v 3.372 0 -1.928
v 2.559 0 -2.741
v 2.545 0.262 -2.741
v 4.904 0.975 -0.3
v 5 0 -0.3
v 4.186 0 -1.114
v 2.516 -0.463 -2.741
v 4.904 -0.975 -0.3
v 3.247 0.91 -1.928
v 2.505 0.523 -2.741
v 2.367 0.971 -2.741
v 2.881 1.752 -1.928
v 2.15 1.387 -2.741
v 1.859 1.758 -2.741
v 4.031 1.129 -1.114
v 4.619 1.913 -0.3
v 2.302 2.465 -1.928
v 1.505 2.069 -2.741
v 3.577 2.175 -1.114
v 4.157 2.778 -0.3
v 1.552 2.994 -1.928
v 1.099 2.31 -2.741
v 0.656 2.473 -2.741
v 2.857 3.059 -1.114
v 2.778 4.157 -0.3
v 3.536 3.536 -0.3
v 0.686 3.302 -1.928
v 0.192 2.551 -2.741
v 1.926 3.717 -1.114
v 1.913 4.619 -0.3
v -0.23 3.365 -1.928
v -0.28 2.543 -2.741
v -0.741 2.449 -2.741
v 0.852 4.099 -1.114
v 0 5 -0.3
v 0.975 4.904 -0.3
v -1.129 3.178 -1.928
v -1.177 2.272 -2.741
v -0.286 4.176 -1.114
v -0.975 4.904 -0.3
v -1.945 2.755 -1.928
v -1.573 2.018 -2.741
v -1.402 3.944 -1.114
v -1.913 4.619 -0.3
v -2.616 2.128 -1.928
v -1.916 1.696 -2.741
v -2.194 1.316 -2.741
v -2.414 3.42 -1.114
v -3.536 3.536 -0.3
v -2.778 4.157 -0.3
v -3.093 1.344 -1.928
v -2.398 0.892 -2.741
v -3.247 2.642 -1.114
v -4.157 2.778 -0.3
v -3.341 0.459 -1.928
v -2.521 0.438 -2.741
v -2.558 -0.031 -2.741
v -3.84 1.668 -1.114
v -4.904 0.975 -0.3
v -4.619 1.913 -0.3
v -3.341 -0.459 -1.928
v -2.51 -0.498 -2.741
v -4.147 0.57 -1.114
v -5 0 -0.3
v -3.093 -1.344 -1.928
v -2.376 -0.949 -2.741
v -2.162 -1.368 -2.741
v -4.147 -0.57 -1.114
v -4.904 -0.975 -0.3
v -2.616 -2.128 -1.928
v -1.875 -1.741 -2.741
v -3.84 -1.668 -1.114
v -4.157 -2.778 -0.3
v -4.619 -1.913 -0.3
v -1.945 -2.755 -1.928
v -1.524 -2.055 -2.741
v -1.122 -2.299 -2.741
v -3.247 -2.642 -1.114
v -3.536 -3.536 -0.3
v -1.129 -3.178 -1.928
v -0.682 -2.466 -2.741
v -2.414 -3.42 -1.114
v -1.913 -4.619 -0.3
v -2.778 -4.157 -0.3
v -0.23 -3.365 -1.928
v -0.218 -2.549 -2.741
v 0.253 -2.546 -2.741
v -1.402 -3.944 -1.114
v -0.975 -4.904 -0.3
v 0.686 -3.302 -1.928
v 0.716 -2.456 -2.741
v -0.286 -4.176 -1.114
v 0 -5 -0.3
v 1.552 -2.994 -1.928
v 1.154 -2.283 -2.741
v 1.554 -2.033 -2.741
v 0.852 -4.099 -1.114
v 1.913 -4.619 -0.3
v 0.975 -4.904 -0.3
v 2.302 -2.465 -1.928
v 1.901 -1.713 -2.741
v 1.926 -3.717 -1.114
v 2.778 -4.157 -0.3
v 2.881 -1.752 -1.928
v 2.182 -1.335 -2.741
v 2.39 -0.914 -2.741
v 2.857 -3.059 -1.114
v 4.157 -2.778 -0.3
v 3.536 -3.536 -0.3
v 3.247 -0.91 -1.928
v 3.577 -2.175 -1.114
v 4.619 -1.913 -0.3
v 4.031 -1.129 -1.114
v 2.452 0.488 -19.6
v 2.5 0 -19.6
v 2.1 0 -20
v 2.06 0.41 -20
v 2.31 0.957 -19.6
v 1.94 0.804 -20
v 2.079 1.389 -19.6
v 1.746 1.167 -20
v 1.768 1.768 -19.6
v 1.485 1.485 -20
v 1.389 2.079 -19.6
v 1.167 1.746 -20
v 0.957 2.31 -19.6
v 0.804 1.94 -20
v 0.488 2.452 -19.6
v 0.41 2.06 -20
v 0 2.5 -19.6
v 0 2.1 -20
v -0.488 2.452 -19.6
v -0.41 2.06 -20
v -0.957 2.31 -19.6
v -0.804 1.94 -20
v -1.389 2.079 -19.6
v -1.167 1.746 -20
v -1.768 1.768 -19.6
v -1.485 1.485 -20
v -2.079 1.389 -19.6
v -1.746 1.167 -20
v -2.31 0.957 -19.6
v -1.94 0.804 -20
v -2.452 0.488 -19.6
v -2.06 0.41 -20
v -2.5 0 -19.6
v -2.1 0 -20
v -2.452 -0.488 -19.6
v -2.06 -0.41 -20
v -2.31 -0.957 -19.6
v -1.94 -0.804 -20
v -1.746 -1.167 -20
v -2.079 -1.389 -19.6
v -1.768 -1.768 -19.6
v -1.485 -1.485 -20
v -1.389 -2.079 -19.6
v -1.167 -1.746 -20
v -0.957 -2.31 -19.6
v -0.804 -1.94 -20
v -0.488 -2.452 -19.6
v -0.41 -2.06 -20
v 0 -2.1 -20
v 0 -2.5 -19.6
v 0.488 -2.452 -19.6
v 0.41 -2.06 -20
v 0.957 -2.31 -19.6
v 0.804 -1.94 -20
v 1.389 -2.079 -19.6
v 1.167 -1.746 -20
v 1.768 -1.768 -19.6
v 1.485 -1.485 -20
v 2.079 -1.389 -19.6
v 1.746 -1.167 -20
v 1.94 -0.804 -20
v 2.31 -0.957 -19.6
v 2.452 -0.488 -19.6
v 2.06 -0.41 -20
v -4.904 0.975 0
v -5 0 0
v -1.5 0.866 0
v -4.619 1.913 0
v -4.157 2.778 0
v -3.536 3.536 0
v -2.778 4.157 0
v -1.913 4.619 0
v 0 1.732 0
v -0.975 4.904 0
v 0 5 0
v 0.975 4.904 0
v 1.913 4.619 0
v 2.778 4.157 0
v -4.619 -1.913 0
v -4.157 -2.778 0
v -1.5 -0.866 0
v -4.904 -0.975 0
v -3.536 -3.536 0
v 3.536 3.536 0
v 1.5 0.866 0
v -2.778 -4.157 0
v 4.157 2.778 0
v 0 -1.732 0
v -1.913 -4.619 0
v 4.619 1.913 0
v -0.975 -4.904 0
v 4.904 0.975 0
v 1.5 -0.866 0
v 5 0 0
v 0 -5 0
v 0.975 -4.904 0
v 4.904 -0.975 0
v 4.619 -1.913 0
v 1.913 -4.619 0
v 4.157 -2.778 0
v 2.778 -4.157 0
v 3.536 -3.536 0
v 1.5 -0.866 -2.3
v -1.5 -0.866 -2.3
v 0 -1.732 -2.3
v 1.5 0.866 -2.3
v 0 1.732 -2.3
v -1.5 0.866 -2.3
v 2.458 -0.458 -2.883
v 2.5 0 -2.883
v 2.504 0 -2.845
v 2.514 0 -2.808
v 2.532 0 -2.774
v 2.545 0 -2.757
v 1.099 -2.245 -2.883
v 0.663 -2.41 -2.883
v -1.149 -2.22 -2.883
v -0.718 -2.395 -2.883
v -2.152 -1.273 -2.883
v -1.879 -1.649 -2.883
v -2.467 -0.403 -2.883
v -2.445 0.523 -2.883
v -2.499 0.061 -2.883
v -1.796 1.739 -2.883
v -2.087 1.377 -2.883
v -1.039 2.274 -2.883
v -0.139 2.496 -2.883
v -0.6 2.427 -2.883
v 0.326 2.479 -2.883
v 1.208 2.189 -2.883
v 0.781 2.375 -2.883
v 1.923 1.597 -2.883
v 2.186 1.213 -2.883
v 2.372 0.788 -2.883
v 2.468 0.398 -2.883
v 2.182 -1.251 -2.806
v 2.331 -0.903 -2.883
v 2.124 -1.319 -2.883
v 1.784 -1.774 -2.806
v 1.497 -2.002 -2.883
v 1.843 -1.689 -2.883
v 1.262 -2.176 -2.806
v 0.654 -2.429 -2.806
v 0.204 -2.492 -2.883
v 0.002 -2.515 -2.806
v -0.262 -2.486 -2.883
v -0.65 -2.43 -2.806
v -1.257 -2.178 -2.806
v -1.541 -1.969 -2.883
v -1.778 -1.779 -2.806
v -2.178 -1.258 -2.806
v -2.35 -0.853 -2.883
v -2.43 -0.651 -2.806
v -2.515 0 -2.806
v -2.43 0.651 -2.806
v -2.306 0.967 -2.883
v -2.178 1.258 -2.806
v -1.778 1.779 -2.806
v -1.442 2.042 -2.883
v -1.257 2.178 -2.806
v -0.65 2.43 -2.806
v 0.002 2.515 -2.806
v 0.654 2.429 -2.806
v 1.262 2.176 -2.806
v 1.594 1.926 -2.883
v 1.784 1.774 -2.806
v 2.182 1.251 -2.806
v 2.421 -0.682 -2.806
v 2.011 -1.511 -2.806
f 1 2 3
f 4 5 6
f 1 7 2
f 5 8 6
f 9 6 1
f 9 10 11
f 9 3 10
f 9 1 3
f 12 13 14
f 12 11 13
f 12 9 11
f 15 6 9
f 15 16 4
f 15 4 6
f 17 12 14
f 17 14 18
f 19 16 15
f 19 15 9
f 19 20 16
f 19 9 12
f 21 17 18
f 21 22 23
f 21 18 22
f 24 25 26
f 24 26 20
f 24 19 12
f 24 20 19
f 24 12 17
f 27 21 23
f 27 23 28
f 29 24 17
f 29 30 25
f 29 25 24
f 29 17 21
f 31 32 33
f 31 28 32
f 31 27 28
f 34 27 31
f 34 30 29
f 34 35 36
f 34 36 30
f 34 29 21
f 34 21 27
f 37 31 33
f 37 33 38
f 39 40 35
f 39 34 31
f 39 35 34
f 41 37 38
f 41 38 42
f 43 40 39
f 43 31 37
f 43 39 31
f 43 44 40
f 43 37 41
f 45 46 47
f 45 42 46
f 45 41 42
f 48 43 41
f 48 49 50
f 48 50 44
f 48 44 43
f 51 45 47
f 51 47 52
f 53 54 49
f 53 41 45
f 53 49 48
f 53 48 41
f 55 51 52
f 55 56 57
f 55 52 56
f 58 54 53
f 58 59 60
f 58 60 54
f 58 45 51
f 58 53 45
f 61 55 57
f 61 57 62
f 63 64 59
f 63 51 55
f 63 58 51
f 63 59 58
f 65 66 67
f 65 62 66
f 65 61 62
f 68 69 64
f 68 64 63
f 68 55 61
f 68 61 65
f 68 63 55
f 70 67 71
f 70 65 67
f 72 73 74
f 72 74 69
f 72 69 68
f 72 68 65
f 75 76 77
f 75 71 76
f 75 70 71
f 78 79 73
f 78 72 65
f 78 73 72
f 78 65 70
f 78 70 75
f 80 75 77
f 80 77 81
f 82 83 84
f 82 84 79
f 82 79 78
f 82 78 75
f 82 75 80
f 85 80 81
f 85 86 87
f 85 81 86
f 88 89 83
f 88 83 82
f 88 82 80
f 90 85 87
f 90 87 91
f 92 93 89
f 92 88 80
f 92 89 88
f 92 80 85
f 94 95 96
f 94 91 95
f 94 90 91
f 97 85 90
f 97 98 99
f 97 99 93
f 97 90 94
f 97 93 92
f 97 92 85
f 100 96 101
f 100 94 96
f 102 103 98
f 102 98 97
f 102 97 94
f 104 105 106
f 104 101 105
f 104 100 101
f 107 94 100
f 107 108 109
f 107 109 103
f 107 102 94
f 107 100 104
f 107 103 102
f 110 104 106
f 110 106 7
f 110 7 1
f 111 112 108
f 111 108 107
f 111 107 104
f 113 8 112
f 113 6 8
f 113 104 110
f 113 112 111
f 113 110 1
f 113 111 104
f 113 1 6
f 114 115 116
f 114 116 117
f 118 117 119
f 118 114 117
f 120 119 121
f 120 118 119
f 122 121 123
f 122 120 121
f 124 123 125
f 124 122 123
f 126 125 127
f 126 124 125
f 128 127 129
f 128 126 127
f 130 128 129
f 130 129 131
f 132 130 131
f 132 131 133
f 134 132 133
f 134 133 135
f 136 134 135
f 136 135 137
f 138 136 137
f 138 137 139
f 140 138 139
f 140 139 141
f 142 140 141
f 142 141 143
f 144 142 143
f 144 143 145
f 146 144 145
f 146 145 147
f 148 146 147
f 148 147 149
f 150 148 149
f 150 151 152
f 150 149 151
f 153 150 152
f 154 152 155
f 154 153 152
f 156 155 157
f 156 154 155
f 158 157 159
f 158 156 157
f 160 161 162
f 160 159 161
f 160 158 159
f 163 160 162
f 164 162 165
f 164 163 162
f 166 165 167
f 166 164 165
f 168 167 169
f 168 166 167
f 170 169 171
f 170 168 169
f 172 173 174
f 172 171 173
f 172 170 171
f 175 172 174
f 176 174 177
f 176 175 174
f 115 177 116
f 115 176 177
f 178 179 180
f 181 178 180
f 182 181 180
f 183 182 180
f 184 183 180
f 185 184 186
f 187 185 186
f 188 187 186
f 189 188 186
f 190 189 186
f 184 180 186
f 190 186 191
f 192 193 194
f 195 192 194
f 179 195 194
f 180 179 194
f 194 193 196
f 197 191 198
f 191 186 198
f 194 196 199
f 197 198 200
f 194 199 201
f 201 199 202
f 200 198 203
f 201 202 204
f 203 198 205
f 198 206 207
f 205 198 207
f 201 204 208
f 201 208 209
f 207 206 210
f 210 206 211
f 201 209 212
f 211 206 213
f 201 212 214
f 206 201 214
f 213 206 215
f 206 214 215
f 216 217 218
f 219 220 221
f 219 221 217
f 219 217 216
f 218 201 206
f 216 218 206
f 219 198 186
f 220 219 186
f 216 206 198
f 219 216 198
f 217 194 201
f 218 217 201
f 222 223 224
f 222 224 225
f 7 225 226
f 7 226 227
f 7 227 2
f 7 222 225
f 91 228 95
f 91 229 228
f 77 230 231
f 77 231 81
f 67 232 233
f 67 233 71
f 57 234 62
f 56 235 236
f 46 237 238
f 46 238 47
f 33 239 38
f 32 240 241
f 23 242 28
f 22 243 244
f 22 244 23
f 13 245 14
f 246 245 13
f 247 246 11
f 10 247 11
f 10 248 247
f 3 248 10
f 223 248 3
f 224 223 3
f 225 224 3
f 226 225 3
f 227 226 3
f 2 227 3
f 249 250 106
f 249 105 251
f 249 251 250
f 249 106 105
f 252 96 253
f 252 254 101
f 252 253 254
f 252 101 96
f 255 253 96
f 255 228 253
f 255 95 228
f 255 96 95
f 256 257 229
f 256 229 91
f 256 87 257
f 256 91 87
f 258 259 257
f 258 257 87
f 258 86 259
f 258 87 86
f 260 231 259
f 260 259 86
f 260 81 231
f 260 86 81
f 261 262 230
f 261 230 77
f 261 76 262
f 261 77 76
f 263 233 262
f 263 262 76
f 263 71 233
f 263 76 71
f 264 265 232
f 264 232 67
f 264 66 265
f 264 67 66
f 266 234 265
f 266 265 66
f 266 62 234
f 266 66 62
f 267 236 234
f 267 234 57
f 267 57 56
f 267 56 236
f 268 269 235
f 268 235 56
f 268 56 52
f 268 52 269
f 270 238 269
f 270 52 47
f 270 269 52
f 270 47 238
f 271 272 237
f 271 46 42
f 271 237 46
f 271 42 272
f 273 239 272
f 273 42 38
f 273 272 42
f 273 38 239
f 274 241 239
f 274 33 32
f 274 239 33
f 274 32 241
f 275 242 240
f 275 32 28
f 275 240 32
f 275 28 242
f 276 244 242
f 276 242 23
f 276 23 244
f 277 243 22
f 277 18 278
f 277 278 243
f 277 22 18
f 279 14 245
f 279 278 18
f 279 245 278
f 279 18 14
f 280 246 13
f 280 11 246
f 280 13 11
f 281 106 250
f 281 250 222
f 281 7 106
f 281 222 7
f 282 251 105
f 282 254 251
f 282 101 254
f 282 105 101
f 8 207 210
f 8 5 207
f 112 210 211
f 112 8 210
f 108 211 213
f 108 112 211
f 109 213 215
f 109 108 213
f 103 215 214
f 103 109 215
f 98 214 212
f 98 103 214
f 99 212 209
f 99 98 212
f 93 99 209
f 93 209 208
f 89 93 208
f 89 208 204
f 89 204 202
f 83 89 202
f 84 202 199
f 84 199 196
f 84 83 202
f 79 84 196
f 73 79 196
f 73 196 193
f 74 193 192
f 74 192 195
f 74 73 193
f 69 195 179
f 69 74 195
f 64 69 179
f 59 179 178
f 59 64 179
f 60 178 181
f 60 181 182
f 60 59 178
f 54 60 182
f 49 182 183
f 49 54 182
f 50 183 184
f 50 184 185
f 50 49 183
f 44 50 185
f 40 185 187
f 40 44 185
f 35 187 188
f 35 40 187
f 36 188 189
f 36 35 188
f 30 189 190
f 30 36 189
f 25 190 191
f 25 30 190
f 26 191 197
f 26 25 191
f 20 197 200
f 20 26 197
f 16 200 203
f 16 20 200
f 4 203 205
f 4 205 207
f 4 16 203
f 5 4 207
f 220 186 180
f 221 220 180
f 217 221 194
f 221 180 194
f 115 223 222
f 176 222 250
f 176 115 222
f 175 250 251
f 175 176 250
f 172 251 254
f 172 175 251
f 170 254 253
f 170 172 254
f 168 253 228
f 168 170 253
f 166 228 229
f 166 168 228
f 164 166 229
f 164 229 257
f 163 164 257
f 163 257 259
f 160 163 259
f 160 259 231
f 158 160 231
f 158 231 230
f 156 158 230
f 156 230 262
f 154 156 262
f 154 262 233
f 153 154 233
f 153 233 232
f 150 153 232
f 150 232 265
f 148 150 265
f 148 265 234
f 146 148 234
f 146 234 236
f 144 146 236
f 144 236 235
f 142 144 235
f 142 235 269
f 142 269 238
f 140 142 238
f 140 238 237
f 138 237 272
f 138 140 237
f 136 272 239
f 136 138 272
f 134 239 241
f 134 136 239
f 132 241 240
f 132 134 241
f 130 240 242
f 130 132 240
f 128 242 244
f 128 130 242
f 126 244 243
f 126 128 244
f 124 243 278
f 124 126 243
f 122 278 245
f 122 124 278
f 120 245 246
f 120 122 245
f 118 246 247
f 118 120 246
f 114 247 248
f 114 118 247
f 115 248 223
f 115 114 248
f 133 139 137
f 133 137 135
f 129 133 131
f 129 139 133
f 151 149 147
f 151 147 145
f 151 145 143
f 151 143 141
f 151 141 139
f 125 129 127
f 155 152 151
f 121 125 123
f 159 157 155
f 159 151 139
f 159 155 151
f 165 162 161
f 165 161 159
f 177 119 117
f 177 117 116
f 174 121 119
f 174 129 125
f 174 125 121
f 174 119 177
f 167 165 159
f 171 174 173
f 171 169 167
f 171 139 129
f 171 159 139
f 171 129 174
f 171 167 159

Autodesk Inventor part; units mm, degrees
ref_plane "YZ Plane" through (0, 0, 0) normal (1, 0, 0) x (0, 1, 0)
sketch "Sketch1" plane through (0, 0, 0) normal (0, 1, 0) x (-1, 0, 0)
  point P0 (0, 0)
sketch "Sketch2" plane through (0, 0, 0) normal (0, 1, 0) x (-1, 0, 0)
  line L0 (-2.5, -20) -> (0, -20)
  line L1 (-2.5, -2.8) -> (-2.5, -20)
  line L2 (-5, -0.3) -> (-2.5, -2.8)
  line L3 (-5, 0) -> (-5, -0.3)
  line L4 (0, 0) -> (-5, 0)
  line L5 (0, -20) -> (0, 0)
  line L6 (0, -20) -> (0, 0)
  line L7 (0, -24) -> (0, 4) projected
  line L8 (1, 0) -> (-6, 0) projected
  dimension "d3" = 5
  dimension "d5" = 2.5
  dimension "d7" = 20
  dimension "ParC" = 0.3
  dimension "d22" = 0
  dimension "d23" = 0
  dimension "d43" = 45
revolve "Revolution1" add sketch "Sketch2" angle 360 about axis through (0, 0, -20) along (0, 0, -1)
sketch "Sketch3" plane through (0, 0, 0) normal (0, 0, 1) x (1, 0, 0)
  line L0 (-1.5, 0.866) -> (-1.5, -0.866)
  line L1 (0, 1.7321) -> (-1.5, 0.866)
  line L2 (1.5, 0.866) -> (0, 1.7321)
  line L3 (1.5, -0.866) -> (1.5, 0.866)
  line L4 (0, -1.7321) -> (1.5, -0.866)
  line L5 (-1.5, -0.866) -> (0, -1.7321)
  circle A0 centre (0, 0) radius 1.5 construction
  circle A1 centre (0, 0) radius 2.5 construction
  dimension "d11" = 3
  dimension "d13" = 120
  dimension "d15" = 120
extrude "Extrusion1" cut sketch "Sketch3" against normal blind 2.3
fillet "Fillet1" radius 0.2 1 edges at (-2.5, 0, -2.8)
chamfer "Chamfer1" distance 0.4 angle 45 1 edges at (-2.5, 0, -20) measured on face at (-0.599, -2.4272, -14.2943)
thread "Thread1" size "M5x0.8" class "6g" standard "ISO Metric profile" length 15.6
ref_plane "MSC_PF1" through (0, 0, 0) normal (1, 0, 0) x (0, 1, 0)
ref_plane "MSC_PT1" through (0, 0, 0) normal (0, 0, -1) x (-1, 0, 0)
equation "\"d3\" = 0.5 * dk"
equation "\"d5\" = 0.5 * NND"
equation "\"d7\" = NLG"
equation "\"d43\" = 0.5 * ang"
equation "\"d18\" = r"
equation "\"d19\" = 0.5 * PTC"
equation "\"d39\" = 0.5 * PTC"
equation "\"d11\" = ParS"
equation "\"d16\" = ParT"
equation "\"NND\" = 5"
equation "\"PTC\" = 0.8"
equation "\"ParK\" = 2.8"
equation "\"ParS\" = 3"
equation "\"ParT\" = 2.3"
equation "\"r\" = 0.2"
equation "\"NLG\" = 20"
equation "\"ang\" = 90deg"
equation "\"THREADDIA\" = NND"
equation "\"dk\" = 10"
properties part number "DIN 7991 - M5x20" material "Steel, Mild"
